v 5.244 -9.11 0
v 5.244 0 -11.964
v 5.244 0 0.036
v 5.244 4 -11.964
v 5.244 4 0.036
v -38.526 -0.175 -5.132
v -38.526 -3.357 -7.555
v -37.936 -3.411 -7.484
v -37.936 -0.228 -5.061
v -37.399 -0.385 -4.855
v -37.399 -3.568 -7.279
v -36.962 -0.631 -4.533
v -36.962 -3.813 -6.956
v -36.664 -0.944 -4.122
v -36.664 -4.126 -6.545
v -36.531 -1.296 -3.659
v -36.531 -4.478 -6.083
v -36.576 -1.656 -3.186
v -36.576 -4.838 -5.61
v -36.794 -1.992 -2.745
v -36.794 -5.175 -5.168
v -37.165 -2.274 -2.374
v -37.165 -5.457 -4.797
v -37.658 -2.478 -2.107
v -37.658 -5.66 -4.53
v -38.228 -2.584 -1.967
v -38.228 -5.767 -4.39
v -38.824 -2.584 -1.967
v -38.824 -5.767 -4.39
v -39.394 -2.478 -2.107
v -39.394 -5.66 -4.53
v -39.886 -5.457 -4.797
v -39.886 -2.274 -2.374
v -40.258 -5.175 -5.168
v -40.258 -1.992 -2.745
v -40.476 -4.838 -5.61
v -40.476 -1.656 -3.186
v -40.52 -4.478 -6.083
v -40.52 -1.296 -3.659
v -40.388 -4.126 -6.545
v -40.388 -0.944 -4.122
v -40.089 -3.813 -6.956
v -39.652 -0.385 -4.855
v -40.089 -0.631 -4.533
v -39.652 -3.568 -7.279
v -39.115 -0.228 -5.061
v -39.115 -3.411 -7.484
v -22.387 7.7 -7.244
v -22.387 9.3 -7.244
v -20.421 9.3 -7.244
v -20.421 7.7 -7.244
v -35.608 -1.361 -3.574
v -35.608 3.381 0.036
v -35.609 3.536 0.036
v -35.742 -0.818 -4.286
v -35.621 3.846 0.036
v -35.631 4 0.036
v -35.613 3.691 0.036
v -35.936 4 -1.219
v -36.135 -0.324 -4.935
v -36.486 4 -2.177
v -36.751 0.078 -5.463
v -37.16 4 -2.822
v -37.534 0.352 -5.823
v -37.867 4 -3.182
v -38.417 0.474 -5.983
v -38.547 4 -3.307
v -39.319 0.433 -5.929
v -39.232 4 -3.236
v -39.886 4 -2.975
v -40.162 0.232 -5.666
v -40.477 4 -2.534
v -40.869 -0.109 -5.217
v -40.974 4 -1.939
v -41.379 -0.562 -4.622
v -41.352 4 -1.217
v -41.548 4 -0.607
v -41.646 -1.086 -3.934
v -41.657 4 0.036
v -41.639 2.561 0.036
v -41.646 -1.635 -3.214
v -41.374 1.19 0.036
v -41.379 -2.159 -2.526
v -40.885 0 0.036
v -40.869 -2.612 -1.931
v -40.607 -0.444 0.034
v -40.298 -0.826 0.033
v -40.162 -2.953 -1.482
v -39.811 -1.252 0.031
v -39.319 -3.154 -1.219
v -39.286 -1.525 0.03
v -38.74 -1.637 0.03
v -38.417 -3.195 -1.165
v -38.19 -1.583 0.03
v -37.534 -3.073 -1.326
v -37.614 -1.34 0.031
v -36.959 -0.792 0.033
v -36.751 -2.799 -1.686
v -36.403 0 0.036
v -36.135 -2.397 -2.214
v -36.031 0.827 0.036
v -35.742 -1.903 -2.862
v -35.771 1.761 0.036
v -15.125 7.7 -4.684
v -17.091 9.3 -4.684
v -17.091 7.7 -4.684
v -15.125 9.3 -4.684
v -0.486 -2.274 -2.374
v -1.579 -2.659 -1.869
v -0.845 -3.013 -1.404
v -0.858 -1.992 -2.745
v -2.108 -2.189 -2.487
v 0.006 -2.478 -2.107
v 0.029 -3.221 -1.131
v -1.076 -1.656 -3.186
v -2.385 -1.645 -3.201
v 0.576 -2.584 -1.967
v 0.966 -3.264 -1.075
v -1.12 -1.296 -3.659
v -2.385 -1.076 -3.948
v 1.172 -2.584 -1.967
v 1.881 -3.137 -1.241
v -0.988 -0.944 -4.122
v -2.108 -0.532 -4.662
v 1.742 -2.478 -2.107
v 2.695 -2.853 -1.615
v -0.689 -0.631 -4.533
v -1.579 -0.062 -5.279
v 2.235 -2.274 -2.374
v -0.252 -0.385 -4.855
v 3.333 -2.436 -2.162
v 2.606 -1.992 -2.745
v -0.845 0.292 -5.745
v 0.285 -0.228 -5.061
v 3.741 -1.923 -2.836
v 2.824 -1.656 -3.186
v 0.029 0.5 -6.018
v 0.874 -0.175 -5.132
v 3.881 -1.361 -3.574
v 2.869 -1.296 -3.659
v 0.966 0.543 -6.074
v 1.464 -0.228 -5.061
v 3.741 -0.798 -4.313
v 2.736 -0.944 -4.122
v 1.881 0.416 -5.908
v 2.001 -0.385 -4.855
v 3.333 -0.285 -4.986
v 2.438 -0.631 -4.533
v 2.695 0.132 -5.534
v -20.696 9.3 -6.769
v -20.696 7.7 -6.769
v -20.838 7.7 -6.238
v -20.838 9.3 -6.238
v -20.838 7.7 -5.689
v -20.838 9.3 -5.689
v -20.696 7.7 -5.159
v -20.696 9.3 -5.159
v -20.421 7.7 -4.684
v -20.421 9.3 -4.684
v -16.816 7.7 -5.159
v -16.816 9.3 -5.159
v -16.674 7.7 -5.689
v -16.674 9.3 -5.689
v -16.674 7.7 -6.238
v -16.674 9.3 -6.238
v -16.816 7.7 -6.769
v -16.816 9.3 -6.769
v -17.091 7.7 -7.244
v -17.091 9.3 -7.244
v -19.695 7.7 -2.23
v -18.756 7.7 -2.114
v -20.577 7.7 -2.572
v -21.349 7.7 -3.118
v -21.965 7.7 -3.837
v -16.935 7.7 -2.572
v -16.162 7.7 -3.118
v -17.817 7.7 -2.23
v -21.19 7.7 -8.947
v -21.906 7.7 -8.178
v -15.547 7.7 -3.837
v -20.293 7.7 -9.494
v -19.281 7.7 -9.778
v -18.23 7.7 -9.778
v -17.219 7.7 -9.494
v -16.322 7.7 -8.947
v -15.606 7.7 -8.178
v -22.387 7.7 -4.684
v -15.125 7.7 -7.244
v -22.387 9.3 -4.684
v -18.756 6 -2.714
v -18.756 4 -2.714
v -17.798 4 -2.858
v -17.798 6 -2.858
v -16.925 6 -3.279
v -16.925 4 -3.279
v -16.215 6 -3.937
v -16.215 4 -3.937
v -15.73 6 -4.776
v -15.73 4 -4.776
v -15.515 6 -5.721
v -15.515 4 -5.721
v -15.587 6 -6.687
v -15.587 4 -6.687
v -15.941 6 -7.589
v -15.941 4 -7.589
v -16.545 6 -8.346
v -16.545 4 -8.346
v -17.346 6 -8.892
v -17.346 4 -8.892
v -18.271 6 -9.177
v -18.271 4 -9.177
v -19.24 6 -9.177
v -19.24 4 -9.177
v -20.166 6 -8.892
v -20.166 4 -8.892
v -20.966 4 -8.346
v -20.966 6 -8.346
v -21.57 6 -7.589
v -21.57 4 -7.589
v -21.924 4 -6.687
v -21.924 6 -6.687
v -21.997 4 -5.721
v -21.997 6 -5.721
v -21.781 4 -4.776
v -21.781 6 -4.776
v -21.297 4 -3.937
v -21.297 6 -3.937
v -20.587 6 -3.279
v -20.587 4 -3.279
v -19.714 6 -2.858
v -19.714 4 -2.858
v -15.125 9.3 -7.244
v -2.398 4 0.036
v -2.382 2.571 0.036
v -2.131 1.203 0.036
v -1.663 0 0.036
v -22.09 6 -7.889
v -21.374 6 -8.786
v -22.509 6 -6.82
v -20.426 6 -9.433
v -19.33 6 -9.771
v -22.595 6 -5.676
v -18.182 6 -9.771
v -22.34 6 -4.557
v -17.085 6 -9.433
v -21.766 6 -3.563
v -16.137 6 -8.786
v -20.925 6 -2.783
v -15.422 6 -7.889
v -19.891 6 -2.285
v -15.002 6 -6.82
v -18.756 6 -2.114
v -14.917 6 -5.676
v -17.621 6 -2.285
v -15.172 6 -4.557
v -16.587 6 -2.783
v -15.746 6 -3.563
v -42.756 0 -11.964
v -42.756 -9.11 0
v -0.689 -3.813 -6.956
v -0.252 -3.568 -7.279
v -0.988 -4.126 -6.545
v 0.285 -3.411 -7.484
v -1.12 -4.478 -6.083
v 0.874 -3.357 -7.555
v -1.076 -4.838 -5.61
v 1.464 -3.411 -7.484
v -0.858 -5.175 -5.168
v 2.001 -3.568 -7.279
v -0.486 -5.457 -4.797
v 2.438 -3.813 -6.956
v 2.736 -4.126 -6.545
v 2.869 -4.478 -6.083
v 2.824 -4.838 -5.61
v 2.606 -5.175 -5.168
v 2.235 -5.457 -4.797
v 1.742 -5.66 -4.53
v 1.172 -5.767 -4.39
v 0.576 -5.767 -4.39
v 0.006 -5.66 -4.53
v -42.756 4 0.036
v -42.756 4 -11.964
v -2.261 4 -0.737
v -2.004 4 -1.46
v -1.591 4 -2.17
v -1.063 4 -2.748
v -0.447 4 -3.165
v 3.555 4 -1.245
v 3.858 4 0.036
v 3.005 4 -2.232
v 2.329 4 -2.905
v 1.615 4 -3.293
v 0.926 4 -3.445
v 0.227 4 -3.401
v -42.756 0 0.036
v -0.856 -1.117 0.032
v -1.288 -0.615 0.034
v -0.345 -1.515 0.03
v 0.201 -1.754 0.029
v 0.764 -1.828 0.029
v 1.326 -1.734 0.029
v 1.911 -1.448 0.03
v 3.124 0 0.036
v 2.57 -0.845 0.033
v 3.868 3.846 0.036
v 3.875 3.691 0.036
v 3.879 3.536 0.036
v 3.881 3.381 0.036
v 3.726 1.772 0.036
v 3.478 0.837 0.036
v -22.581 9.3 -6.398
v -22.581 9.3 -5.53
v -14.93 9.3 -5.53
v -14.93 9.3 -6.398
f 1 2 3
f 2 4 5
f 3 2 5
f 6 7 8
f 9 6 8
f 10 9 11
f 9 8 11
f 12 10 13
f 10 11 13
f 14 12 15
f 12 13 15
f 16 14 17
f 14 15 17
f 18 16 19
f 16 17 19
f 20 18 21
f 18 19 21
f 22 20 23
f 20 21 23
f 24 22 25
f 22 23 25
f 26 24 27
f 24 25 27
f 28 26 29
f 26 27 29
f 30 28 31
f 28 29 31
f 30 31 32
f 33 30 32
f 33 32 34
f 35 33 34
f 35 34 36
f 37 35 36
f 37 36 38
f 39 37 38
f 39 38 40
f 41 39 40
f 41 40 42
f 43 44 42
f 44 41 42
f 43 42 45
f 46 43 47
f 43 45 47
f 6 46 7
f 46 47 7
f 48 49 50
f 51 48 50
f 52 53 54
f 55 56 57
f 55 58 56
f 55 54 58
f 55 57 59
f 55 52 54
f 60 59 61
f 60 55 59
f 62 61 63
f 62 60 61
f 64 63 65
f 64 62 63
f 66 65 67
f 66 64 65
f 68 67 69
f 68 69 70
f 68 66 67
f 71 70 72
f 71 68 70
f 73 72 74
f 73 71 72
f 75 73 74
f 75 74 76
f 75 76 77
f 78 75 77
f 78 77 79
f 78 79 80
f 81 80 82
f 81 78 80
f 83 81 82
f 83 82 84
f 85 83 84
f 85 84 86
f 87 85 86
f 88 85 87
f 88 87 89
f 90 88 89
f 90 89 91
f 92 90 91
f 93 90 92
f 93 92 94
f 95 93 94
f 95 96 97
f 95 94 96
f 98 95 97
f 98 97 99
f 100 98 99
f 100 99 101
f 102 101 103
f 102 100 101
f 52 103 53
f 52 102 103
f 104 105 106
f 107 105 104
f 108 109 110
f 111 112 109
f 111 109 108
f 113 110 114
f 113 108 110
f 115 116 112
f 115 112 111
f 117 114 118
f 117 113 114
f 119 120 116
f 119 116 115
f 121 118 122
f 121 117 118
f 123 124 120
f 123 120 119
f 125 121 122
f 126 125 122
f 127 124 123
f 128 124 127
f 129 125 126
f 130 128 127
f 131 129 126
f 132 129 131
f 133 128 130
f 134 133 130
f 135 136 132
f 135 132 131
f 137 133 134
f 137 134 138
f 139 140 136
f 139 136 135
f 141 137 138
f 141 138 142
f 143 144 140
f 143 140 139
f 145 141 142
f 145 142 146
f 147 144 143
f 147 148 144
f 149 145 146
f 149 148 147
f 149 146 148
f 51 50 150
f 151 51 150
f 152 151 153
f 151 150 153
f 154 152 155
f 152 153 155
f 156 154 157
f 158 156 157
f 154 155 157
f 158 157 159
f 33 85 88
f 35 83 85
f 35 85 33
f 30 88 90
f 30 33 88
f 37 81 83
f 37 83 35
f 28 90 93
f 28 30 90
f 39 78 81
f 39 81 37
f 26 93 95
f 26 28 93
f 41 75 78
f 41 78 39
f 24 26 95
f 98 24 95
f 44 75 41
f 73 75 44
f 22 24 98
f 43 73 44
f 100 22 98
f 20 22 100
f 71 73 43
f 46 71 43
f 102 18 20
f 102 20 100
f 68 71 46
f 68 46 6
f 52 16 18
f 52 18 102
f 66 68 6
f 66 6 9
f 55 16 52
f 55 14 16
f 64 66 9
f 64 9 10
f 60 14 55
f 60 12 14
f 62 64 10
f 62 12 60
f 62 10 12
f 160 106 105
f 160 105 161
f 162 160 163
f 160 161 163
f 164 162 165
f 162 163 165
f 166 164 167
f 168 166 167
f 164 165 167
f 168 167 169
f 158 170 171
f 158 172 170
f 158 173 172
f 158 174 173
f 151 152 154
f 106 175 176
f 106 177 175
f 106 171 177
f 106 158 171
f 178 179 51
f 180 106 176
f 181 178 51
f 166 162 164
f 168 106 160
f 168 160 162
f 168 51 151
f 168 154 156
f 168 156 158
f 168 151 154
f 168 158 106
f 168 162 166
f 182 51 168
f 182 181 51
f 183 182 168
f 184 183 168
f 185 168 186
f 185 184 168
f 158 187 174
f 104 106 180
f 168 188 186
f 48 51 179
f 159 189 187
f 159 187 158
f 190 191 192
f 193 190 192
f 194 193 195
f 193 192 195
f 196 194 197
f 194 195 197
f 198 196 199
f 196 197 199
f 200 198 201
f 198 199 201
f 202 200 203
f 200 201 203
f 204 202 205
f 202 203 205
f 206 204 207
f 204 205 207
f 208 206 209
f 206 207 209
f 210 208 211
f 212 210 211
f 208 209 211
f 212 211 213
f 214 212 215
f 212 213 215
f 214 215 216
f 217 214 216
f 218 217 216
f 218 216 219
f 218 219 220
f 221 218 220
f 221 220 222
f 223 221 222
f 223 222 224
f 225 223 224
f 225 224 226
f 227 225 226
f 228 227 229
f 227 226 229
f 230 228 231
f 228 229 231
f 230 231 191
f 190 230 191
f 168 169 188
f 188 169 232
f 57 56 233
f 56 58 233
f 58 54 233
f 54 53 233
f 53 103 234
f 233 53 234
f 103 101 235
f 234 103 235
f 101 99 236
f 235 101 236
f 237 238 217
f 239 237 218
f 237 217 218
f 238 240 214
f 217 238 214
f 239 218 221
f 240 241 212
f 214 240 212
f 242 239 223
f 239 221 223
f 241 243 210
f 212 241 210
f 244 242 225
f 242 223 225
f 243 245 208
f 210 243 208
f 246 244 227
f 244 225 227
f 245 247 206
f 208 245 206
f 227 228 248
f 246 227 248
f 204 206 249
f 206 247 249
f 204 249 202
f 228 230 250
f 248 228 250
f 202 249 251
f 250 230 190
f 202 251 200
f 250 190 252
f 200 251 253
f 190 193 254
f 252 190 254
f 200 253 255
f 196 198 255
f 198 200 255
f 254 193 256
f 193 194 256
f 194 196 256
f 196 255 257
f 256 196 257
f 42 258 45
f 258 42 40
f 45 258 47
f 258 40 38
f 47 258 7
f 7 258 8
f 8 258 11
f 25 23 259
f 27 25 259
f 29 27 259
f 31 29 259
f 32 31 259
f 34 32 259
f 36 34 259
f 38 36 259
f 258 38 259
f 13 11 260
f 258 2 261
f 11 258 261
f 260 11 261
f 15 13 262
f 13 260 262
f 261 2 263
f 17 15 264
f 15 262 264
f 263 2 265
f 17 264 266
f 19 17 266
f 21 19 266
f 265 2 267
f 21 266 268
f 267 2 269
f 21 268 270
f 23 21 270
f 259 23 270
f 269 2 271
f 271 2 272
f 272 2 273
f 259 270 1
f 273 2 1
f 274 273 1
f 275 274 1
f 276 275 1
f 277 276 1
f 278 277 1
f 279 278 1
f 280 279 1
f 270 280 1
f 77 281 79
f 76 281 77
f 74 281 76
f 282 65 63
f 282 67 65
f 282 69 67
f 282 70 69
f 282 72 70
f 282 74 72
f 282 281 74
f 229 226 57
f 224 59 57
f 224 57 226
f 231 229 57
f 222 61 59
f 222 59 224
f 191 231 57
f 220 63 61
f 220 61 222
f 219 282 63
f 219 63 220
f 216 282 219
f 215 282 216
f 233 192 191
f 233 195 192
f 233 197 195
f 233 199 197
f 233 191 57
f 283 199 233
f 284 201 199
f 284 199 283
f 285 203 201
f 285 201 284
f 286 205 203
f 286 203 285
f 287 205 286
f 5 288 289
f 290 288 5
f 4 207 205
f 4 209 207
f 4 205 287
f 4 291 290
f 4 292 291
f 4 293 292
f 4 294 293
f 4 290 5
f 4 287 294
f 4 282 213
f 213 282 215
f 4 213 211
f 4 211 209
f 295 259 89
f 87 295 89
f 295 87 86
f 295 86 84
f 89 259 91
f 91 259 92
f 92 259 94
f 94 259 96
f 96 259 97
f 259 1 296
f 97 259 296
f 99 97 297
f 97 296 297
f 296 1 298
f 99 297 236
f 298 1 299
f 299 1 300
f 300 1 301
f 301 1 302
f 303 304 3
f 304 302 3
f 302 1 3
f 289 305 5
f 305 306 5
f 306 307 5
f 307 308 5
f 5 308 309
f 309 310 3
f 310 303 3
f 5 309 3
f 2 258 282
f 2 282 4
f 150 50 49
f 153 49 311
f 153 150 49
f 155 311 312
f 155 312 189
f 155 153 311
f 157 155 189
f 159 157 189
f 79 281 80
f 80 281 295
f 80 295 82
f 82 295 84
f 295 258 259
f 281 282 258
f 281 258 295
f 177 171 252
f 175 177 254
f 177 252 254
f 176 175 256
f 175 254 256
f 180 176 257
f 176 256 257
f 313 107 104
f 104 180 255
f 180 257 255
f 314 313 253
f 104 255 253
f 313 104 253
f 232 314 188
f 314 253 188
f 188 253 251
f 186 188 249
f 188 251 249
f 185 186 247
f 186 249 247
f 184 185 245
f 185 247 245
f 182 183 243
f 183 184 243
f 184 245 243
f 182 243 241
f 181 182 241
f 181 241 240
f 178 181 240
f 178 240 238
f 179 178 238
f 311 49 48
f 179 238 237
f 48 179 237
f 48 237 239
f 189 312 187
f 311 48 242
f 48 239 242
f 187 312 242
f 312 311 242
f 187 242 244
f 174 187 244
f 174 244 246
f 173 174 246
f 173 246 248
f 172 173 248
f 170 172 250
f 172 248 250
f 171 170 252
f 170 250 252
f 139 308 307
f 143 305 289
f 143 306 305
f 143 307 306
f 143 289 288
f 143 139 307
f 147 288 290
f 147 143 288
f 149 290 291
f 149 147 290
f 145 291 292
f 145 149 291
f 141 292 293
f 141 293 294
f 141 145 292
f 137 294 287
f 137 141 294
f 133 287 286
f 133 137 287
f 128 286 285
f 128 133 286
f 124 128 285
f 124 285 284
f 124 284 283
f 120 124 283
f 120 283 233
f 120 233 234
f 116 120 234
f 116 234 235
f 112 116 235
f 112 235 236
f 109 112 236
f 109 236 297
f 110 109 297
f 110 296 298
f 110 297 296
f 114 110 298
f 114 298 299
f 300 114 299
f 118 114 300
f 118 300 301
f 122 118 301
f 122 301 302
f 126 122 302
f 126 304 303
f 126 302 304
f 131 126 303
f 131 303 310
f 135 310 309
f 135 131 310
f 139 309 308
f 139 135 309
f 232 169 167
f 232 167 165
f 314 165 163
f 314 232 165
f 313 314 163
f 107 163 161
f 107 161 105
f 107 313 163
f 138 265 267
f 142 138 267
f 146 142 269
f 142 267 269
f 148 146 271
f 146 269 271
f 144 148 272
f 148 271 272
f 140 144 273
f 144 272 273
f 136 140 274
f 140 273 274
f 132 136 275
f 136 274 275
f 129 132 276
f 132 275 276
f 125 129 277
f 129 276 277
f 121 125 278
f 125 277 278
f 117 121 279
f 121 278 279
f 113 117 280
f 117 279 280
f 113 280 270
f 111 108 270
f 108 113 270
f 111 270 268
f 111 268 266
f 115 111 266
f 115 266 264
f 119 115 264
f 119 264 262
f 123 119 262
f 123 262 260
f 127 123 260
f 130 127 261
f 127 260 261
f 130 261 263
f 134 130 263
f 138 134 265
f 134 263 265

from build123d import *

# Parameters (mm, degrees)
SKETCH1_W                 = 48
SKETCH1_H                 = 12
BOSS_EXTRUDE2_DEPTH       = 4
SKETCH3_R                 = 3.25
BOSS_EXTRUDE3_DEPTH       = 2
SKETCH4_R                 = 3.85
BOSS_EXTRUDE4_DEPTH       = 3.3
SKETCH5_W                 = 10.744623103
SKETCH5_H                 = 3.104002229
SKETCH5_W_2               = 12.040799858
SKETCH5_H_2               = 4.707168217
CUT_EXTRUDE6_DEPTH        = 1.6
SKETCH6_R                 = 2.1
CUT_EXTRUDE7_DEPTH        = 1.6
BOSS_EXTRUDE5_DEPTH       = 48
SKETCH11_R                = 2
CUT_EXTRUDE12_DEPTH       = 46.960925441
CUT_EXTRUDE13_START       = -3.247821806
CUT_EXTRUDE13_OUTLINE_R   = 3.036171251
CUT_EXTRUDE13_OUTLINE_R_2 = 2
CUT_EXTRUDE13_OUTLINE_R_3 = 3.150431912
CUT_EXTRUDE13_DEPTH       = 6.452188627


# Read off the part's stored shape, not the designer's step: Cut-Extrude13
with BuildPart() as part:
    # Sketch1 → Boss-Extrude2 (new body)
    with BuildSketch(Plane(origin=(0, 0, 0), x_dir=(1, 0, 0), z_dir=(0, 1, 0))):
        with Locations((-18.755819717, 5.963784416)):
            Rectangle(SKETCH1_W, SKETCH1_H)
    extrude(amount=BOSS_EXTRUDE2_DEPTH)

    # Sketch3 → Boss-Extrude3 (add)
    with BuildSketch(Plane(origin=(0, 4, 0), x_dir=(1, 0, 0), z_dir=(0, 1, 0))):
        with Locations(Location((-18.755819717, 5.963784416, 0), (0, 0, 270))):
            Circle(SKETCH3_R)
    extrude(amount=BOSS_EXTRUDE3_DEPTH)

    # Sketch4 → Boss-Extrude4 (add)
    with BuildSketch(Plane(origin=(0, 6, 0), x_dir=(1, 0, 0), z_dir=(0, 1, 0))):
        with Locations(Location((-18.755819717, 5.963784416, 0), (0, 0, 270))):
            Circle(SKETCH4_R)
    extrude(amount=BOSS_EXTRUDE4_DEPTH)

    # Sketch5 → Cut-Extrude6 (cut)
    with BuildSketch(Plane(origin=(0, 9.3, 0), x_dir=(1, 0, 0), z_dir=(0, 1, 0))):
        with Locations((-18.784487645, 3.131783302)):
            Rectangle(SKETCH5_W, SKETCH5_H)
        with Locations((-18.682157901, 9.597368525)):
            Rectangle(SKETCH5_W_2, SKETCH5_H_2)
    extrude(amount=-CUT_EXTRUDE6_DEPTH, mode=Mode.SUBTRACT)

    # Sketch6 → Cut-Extrude7 (cut)
    with BuildSketch(Plane(origin=(0, 9.3, 0), x_dir=(1, 0, 0), z_dir=(0, 1, 0))):
        with Locations((-18.755819717, 5.963784416)):
            Circle(SKETCH6_R)
    extrude(amount=-CUT_EXTRUDE7_DEPTH, mode=Mode.SUBTRACT)

    # Sketch7 → Boss-Extrude5 (add)
    with BuildSketch(Plane(origin=(5.244180283, 0, 0), x_dir=(0, 0, -1), z_dir=(1, 0, 0))):
        Polygon((11.963784416, 0), (0, -9.109804798), (-0.036215584, 0), align=None)
    extrude(amount=-BOSS_EXTRUDE5_DEPTH)

    # Sketch11 → Cut-Extrude12 (cut, through all)
    with BuildSketch(Plane(origin=(0, -5.766415649, -4.390828112), x_dir=(1, 0, 0), z_dir=(0, -0.7956067081089262, -0.6058134746042532))):
        with Locations(Location((0.874180283, -1.977052592, 0), (0, 0, 270))):
            Circle(SKETCH11_R)
        with Locations(Location((-38.525819717, -1.977052592, 0), (0, 0, 270))):
            Circle(SKETCH11_R)
    extrude(amount=-CUT_EXTRUDE12_DEPTH, mode=Mode.SUBTRACT)

    # Cut-Extrude13 outline → Cut-Extrude13 (cut)
    # profile 1 of 2: a face of its own
    with BuildSketch(Plane(origin=(0, 0, 0), x_dir=(1, 0, 0), z_dir=(0, 0.7956067081089261, 0.6058134746042532)).offset(CUT_EXTRUDE13_START)):
        with Locations((-38.643729383, 2.019534021)):
            Circle(CUT_EXTRUDE13_OUTLINE_R)
        with Locations((-38.525819717, 1.977052592)):
            Circle(CUT_EXTRUDE13_OUTLINE_R_2, mode=Mode.SUBTRACT)
    # profile 2 of 2: a face of its own
    with BuildSketch(Plane(origin=(0, 0, 0), x_dir=(1, 0, 0), z_dir=(0, 0.7956067081089261, 0.6058134746042532)).offset(CUT_EXTRUDE13_START)):
        with Locations((0.730306236, 2.019534021)):
            Circle(CUT_EXTRUDE13_OUTLINE_R_3)
        with Locations((0.874180283, 1.977052592)):
            Circle(CUT_EXTRUDE13_OUTLINE_R_2, mode=Mode.SUBTRACT)
    extrude(amount=CUT_EXTRUDE13_DEPTH, mode=Mode.SUBTRACT)


solid = part.part
